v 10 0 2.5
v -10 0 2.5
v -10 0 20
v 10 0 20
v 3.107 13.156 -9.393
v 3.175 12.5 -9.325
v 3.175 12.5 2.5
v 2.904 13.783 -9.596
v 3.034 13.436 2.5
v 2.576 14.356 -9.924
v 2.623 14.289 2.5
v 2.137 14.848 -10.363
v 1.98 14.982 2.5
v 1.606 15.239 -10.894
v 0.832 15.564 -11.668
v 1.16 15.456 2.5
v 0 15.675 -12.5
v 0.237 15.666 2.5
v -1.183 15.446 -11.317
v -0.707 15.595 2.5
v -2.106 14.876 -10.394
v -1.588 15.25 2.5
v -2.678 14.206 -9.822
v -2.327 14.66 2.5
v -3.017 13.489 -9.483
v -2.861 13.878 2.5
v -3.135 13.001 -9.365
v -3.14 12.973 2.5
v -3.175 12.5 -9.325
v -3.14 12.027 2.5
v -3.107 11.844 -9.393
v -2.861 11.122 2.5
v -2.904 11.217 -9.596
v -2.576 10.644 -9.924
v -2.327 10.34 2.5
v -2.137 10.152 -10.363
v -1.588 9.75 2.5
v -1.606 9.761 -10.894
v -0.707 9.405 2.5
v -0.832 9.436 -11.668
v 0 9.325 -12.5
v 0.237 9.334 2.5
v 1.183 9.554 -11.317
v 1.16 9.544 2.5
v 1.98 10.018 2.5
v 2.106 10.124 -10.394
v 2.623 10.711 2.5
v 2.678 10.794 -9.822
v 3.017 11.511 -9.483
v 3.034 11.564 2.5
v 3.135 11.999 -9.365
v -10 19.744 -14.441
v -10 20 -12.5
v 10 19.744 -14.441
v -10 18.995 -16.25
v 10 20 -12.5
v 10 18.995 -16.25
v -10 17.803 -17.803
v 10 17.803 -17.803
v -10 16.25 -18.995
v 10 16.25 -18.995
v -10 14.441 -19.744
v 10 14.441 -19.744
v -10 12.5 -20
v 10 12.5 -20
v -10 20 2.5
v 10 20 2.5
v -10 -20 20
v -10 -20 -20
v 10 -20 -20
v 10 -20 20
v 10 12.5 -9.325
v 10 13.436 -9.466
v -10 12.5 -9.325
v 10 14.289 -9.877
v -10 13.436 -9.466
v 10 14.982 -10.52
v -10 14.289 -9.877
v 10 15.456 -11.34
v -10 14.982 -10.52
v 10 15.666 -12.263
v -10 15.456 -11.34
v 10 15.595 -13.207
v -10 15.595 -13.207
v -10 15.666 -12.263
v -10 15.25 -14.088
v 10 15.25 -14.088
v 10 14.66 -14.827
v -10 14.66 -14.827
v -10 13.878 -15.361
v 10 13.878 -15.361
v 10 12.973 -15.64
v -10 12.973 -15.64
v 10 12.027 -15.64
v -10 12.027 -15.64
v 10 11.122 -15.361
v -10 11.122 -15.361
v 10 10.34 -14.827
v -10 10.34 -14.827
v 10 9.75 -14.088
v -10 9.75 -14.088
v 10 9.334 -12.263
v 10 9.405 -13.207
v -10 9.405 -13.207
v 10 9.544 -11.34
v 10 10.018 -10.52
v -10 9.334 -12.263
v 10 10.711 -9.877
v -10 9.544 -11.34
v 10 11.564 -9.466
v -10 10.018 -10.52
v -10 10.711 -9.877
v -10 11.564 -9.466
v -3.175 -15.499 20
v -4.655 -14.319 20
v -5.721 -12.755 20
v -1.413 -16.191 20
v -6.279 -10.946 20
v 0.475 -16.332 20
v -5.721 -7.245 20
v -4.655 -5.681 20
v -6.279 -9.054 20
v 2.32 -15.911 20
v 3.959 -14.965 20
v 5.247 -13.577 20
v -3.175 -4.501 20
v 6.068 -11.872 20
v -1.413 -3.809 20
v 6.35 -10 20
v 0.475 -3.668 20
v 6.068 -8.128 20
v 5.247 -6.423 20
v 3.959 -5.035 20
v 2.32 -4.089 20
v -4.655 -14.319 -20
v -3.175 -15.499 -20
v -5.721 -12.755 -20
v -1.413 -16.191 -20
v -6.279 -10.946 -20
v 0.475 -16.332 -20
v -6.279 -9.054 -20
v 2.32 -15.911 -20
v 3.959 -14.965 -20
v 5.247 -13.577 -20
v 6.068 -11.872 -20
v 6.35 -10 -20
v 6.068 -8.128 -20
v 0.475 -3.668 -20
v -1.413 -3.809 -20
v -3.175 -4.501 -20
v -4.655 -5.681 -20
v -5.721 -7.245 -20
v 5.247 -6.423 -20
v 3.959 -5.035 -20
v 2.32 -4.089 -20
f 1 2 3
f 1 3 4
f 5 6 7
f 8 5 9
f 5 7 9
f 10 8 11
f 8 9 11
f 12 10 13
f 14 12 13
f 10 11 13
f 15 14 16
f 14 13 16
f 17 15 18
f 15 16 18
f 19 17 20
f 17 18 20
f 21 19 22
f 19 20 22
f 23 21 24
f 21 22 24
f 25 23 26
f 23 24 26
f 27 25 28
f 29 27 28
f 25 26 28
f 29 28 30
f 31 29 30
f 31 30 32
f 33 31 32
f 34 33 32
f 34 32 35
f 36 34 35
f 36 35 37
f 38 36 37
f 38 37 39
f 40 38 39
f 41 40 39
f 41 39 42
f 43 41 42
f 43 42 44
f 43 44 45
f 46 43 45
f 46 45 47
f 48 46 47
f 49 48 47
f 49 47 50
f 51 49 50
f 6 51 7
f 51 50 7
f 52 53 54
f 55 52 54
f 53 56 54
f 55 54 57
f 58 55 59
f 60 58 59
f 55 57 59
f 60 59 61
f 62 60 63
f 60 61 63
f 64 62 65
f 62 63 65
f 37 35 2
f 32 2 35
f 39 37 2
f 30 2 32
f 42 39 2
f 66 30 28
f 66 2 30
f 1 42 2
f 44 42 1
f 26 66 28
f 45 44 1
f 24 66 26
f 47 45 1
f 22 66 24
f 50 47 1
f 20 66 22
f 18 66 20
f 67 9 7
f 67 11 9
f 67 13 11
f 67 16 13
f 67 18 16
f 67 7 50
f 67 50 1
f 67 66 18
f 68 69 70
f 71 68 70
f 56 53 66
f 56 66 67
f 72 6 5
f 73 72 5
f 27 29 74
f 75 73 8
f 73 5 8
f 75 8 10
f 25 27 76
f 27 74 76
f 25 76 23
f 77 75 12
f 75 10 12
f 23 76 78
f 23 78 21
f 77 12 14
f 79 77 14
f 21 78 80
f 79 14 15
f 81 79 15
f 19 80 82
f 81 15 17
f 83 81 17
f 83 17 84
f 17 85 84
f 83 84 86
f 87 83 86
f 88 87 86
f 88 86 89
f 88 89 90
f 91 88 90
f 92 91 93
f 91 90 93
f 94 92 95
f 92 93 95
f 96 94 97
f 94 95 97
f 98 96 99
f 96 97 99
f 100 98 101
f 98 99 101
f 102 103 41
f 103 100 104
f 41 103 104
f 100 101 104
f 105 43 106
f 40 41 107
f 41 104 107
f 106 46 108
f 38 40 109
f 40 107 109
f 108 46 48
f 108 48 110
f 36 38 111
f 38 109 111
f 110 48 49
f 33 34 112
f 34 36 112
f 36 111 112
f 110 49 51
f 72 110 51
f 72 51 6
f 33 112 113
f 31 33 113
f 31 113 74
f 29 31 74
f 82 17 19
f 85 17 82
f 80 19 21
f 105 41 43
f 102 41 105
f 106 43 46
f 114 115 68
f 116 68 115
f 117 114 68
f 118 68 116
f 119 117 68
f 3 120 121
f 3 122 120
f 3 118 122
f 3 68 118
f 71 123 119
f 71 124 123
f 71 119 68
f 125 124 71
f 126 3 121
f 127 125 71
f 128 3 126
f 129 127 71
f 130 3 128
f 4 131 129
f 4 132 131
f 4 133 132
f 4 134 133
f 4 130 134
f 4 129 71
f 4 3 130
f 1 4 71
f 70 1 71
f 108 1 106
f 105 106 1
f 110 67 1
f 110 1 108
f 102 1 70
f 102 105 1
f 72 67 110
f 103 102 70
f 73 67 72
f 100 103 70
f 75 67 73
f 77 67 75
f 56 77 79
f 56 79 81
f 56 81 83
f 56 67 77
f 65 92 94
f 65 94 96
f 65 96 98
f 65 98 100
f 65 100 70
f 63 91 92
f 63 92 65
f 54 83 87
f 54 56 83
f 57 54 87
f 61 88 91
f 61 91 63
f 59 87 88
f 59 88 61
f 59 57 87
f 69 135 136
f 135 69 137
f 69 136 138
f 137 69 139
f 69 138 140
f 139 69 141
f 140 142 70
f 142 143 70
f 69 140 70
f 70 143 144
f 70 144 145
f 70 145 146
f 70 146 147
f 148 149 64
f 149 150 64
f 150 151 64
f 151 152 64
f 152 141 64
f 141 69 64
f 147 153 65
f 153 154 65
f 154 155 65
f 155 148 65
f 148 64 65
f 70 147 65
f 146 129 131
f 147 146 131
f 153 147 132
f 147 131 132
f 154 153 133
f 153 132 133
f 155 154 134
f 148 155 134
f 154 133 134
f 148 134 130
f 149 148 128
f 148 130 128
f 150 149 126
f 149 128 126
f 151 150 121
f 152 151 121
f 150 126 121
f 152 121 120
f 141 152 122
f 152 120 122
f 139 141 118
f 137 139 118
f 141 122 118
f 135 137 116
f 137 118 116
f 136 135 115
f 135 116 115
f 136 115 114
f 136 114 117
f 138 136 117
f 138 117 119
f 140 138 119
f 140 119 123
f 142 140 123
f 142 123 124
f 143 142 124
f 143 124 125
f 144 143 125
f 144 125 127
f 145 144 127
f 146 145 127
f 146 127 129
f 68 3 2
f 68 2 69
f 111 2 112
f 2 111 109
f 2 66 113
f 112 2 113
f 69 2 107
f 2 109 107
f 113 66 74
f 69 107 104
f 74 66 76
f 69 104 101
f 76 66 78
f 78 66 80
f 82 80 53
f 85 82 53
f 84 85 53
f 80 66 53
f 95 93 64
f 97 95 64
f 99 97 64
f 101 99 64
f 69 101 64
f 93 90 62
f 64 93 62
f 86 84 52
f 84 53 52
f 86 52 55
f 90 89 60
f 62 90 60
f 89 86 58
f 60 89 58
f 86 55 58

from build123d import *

# Parameters (mm, degrees)
SKETCH3_W           = 20
SKETCH3_H           = 40
BOSS_EXTRUDE2_DEPTH = 20
FILLET2_R           = 7.5
SKETCH4_R           = 3.175
CUT_EXTRUDE2_DEPTH  = 21
SKETCH5_W           = 20
SKETCH5_H           = 17.5
CUT_EXTRUDE3_DEPTH  = 20
CUT_EXTRUDE4_REACH  = 24.5
SKETCH6_R           = 3.175
SKETCH7_R           = 6.35
CUT_EXTRUDE5_DEPTH  = 41


with BuildPart() as part:
    # Sketch3 → Boss-Extrude2 (new body, symmetric)
    with BuildSketch(Plane(origin=(0, 0, 0), x_dir=(1, 0, 0), z_dir=(0, 1, 0))):
        Rectangle(SKETCH3_W, SKETCH3_H)
    extrude(amount=BOSS_EXTRUDE2_DEPTH, both=True)

    # Fillet2
    fillet2_edges = [part.edges().sort_by_distance(p)[0] for p in [
        (0, 20, -20),
    ]]
    fillet(fillet2_edges, radius=FILLET2_R)

    # Sketch4 → Cut-Extrude2 (cut, through all)
    with BuildSketch(Plane.ZY.offset(10)):
        with Locations((-12.5, 12.5)):
            Circle(SKETCH4_R)
    extrude(amount=-CUT_EXTRUDE2_DEPTH, mode=Mode.SUBTRACT)

    # Sketch5 → Cut-Extrude3 (cut)
    with BuildSketch(Plane(origin=(0, 20, 0), x_dir=(1, 0, 0), z_dir=(0, 1, 0))):
        with Locations((0, -11.25)):
            Rectangle(SKETCH5_W, SKETCH5_H)
    extrude(amount=-CUT_EXTRUDE3_DEPTH, mode=Mode.SUBTRACT)

    # Sketch6 → Cut-Extrude4 (cut, up to next)
    with BuildSketch(Plane.XY.offset(2.5), mode=Mode.PRIVATE) as cut_extrude4_sk1:
        with Locations((0, 12.5)):
            Circle(SKETCH6_R)
    cut_extrude4_tool1 = extrude(cut_extrude4_sk1.sketch, amount=-CUT_EXTRUDE4_REACH, mode=Mode.PRIVATE) & part.part
    add(cut_extrude4_tool1.solids().sort_by_distance((0, 12.5, 2.5))[0], mode=Mode.SUBTRACT)

    # Sketch7 → Cut-Extrude5 (cut, through all)
    with BuildSketch(Plane.XY.offset(20)):
        with Locations((0, -10)):
            Circle(SKETCH7_R)
    extrude(amount=-CUT_EXTRUDE5_DEPTH, mode=Mode.SUBTRACT)


solid = part.part
